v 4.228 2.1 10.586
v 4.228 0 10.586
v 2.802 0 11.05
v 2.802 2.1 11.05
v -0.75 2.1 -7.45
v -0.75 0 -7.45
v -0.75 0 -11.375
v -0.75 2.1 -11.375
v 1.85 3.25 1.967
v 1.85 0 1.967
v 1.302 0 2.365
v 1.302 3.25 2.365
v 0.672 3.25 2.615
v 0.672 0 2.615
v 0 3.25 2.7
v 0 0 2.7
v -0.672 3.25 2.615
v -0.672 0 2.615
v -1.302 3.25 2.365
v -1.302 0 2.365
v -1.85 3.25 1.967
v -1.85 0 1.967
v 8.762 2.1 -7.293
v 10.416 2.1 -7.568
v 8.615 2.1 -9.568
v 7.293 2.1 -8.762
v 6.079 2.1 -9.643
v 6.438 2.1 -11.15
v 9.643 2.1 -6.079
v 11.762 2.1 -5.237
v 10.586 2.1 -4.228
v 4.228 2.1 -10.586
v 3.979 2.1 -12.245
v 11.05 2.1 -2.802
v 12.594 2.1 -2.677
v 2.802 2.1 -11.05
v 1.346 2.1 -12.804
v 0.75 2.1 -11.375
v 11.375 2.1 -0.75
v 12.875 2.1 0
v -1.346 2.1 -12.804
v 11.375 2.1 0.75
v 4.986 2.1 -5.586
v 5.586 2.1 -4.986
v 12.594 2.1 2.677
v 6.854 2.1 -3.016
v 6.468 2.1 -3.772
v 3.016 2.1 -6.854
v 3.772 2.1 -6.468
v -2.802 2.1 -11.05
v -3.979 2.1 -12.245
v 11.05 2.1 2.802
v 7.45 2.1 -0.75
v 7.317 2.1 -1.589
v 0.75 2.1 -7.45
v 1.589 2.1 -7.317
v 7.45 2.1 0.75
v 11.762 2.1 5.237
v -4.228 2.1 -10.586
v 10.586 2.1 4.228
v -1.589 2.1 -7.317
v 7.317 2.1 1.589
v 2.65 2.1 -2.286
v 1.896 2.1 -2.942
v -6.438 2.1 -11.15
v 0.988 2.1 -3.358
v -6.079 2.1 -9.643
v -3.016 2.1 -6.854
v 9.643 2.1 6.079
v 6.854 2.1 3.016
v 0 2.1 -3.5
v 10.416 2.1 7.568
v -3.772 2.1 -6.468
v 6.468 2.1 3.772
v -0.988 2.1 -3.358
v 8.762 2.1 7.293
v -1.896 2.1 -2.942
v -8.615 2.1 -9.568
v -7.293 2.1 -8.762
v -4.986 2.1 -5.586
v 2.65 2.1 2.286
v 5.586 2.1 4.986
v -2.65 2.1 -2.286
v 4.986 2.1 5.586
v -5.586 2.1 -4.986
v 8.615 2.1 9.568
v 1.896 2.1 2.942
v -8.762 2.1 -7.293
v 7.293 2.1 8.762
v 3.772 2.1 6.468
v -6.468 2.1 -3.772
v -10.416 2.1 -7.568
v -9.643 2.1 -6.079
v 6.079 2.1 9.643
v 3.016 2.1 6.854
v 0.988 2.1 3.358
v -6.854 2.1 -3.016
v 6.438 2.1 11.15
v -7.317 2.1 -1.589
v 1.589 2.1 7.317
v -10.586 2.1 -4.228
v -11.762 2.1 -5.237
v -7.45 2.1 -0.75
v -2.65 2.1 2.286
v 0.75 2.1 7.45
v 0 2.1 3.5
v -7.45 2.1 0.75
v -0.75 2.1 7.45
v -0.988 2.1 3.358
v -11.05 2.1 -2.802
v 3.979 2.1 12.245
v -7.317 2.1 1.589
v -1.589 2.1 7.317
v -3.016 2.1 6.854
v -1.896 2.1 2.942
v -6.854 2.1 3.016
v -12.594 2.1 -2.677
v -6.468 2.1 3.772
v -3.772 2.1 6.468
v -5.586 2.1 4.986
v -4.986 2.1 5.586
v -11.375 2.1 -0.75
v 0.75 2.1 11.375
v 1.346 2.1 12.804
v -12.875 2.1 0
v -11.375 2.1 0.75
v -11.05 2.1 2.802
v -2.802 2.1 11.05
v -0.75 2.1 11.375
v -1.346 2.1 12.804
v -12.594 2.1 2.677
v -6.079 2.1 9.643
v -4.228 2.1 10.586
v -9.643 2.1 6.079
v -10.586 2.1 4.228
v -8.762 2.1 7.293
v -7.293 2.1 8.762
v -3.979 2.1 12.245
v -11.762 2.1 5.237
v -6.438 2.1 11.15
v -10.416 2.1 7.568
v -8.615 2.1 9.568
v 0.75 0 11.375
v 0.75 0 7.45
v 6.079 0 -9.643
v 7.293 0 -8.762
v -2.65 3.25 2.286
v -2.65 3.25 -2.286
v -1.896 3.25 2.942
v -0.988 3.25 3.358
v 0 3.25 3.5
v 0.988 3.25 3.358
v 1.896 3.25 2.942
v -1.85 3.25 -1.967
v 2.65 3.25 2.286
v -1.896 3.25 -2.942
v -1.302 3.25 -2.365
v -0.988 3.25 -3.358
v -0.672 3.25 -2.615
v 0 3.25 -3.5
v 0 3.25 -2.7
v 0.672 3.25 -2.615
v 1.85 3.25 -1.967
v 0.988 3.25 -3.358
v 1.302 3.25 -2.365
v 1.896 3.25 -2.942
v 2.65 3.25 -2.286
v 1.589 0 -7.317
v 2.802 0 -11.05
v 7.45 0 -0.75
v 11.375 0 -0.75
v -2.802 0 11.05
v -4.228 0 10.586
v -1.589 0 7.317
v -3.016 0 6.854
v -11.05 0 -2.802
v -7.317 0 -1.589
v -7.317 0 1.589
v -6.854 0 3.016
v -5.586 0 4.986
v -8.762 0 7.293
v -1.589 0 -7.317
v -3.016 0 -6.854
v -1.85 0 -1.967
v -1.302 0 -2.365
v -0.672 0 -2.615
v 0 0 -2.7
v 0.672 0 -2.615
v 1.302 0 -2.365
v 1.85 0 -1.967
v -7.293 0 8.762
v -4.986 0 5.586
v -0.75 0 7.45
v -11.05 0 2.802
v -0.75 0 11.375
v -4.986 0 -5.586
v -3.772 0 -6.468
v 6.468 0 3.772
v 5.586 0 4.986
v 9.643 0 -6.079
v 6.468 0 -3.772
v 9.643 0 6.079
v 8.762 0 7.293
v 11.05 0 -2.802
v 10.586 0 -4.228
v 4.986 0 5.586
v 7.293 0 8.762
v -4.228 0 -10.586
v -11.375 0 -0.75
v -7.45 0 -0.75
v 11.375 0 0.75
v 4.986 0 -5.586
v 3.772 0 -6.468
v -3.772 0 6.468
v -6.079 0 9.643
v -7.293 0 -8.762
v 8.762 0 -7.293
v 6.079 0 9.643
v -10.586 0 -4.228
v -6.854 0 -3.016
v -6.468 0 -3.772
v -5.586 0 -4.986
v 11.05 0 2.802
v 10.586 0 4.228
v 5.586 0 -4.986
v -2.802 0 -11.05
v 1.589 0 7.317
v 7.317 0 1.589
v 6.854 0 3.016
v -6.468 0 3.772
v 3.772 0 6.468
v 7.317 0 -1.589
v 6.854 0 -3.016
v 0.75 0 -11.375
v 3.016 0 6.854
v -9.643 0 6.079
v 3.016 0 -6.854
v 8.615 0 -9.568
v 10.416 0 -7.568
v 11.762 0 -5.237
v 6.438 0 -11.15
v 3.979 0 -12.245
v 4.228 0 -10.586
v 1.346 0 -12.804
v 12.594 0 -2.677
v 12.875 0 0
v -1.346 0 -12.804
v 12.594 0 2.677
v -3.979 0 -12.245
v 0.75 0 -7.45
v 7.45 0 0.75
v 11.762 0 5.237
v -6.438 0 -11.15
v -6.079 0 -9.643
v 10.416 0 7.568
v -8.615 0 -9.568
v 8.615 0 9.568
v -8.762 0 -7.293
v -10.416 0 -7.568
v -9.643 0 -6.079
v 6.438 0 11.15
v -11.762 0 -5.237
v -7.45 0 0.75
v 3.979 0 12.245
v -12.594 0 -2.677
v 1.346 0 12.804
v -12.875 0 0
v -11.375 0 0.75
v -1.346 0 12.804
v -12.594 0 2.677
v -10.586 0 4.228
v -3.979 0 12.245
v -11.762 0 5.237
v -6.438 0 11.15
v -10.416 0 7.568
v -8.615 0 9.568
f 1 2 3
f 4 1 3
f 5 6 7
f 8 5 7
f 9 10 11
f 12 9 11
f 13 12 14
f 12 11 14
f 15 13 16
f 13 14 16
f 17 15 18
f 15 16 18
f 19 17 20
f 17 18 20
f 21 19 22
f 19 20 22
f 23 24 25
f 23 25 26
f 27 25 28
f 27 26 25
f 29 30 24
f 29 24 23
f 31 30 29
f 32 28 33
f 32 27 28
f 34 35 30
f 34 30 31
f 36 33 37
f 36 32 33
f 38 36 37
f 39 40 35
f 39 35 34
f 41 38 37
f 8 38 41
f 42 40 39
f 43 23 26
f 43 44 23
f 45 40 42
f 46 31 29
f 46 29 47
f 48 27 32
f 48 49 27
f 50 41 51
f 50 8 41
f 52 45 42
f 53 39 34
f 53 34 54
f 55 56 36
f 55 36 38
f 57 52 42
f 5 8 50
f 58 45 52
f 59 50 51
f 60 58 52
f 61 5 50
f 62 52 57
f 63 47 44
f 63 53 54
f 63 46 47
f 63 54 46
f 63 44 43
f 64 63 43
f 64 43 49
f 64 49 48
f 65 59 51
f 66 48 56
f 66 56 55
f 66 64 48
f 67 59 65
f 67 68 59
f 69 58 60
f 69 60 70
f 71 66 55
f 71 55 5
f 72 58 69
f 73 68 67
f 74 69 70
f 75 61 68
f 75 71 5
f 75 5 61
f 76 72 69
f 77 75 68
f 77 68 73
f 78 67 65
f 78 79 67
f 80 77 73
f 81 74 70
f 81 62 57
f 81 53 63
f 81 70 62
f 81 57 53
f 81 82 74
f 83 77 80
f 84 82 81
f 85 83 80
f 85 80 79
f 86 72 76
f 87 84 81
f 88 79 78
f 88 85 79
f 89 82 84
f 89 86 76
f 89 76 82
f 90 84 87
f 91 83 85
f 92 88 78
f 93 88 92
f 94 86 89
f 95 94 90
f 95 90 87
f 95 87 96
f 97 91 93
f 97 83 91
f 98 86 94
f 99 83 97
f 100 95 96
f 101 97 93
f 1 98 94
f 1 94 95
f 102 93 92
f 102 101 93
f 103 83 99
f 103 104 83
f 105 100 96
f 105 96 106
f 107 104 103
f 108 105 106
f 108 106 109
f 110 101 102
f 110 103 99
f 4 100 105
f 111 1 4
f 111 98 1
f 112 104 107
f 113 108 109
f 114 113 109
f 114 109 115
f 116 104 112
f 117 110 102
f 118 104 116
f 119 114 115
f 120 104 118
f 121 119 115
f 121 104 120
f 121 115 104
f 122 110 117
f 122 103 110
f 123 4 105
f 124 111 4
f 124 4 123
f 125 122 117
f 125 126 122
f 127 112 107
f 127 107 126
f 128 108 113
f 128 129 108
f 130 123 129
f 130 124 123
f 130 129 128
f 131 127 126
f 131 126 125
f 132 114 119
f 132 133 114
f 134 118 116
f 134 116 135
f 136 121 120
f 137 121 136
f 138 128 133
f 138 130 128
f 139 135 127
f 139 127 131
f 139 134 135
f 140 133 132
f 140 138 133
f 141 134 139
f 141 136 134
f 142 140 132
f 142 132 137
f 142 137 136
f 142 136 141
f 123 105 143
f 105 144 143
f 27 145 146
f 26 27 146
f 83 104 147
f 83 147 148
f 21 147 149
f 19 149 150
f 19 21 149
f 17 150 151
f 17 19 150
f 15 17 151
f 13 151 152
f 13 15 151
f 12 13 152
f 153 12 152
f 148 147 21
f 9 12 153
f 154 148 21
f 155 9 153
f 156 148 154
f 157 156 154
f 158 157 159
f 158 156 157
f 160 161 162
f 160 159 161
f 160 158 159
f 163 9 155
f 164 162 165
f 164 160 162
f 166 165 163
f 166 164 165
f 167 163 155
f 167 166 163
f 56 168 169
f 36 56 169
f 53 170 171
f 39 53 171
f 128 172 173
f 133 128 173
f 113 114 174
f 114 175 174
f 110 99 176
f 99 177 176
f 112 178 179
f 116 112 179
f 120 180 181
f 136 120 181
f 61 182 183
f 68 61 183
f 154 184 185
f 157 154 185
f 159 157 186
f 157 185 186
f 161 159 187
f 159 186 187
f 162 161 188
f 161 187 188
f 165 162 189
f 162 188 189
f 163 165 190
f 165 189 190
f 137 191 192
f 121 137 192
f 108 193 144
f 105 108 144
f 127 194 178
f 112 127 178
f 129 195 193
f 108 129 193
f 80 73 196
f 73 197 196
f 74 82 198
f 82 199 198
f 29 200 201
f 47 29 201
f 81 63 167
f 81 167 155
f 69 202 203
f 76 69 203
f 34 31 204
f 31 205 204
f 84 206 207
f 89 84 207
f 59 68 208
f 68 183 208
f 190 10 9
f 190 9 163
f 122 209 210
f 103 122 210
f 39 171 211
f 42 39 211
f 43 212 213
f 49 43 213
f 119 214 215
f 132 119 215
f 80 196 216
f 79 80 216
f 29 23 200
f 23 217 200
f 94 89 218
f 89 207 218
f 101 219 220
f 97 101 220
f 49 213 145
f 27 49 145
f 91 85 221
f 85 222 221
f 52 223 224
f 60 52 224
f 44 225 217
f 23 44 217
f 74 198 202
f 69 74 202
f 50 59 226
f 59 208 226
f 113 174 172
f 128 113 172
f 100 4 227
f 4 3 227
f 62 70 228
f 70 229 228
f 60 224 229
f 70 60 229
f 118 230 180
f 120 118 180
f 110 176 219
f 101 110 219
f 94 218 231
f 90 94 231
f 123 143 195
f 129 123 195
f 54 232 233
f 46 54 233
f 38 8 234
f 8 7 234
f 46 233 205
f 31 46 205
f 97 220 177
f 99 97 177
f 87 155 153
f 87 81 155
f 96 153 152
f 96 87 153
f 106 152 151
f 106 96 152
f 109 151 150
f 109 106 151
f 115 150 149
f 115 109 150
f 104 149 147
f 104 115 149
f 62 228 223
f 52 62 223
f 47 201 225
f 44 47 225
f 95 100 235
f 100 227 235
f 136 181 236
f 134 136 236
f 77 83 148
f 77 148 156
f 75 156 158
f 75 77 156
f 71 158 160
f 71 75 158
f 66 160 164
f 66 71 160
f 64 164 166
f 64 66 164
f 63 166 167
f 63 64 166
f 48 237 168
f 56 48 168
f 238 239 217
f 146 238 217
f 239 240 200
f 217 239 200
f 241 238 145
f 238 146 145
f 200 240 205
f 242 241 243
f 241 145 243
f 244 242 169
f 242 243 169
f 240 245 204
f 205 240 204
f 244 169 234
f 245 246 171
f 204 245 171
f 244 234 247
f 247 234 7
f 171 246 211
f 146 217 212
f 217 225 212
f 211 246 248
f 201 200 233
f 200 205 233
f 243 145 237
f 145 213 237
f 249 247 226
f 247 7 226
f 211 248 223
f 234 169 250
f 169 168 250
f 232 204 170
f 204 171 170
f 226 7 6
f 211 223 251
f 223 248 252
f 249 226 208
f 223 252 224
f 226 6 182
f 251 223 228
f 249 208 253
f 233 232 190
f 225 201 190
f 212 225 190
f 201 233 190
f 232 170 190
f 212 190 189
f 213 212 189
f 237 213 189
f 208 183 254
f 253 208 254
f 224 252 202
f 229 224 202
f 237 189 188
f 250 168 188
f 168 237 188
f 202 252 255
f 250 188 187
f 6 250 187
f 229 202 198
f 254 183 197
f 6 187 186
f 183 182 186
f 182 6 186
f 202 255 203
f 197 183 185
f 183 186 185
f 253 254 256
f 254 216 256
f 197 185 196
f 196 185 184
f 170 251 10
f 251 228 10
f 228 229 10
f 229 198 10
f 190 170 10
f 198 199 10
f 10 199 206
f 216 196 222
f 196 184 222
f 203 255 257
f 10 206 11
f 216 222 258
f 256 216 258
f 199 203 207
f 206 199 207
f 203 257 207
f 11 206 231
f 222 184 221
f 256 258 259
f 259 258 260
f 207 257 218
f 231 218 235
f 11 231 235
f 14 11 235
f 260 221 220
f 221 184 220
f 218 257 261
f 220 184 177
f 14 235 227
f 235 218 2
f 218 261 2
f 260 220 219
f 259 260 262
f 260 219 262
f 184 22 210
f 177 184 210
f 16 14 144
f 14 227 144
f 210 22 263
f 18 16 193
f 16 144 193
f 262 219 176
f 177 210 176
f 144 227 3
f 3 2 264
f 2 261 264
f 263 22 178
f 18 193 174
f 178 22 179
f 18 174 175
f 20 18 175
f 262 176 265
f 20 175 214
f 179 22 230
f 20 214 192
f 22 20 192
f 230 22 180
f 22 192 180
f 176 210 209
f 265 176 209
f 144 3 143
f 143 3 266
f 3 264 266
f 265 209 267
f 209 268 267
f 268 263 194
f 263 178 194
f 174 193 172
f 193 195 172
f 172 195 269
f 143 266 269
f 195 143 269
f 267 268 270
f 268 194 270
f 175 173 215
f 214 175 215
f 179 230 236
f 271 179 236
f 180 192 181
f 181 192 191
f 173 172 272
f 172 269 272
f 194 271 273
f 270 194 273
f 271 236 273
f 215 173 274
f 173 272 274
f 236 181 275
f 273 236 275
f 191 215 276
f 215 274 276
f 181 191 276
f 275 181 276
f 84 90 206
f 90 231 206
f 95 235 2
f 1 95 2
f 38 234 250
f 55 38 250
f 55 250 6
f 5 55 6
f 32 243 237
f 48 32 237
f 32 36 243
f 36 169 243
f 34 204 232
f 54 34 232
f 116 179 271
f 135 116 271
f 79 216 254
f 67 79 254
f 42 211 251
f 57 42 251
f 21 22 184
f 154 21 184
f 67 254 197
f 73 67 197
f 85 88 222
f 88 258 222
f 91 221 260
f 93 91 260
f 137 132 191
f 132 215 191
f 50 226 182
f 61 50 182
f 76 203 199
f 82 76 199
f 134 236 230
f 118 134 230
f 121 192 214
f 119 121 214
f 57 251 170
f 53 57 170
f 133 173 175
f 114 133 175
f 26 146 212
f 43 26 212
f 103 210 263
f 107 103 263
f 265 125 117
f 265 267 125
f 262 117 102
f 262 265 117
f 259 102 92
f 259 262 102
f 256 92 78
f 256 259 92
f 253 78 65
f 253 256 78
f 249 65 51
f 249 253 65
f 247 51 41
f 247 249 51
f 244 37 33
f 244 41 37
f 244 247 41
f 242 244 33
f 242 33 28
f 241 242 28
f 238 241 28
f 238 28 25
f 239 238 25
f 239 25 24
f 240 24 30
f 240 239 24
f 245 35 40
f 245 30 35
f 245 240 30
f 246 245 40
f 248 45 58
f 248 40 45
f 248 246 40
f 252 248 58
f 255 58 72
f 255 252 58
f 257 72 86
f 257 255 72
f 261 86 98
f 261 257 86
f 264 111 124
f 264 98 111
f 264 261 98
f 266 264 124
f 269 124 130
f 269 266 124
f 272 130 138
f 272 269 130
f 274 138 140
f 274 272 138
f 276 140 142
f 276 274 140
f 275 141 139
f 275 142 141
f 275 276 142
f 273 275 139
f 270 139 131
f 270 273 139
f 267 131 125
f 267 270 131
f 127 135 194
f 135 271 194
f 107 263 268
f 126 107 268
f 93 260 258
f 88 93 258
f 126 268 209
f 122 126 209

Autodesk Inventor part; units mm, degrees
ref_plane "YZ Plane" through (0, 0, 0) normal (1, 0, 0) x (0, 1, 0)
ref_plane "XZ Plane" through (0, 0, 0) normal (0, 1, 0) x (-1, 0, 0)
ref_plane "XY Plane" through (0, 0, 0) normal (0, 0, 1) x (1, 0, 0)
sketch "Sketch1" plane through (0, 0, 0) normal (0, 1, 0) x (-1, 0, 0)
  circle A0 centre (0, 0) radius 12.875
  arc A1 (-1.85, -1.9666) -> (1.85, -1.9666) centre (0, 0) ccw
  line L0 (1.85, 1.9666) -> (1.85, -1.9666)
  line L1 (-1.85, 1.9666) -> (-1.85, -1.9666)
  line L2 (7.45, 0.75) -> (11.375, 0.75)
  line L3 (11.375, 0.75) -> (11.375, -0.75)
  line L4 (11.375, -0.75) -> (7.45, -0.75)
  line L5 (7.45, -0.75) -> (7.45, 0.75)
  line L6 (0, 0) -> (11.375, 0) construction
  line L7 (11.05, 2.8018) -> (7.3171, 1.5889)
  line L8 (10.5865, 4.2284) -> (11.05, 2.8018)
  line L9 (6.8536, 3.0155) -> (10.5865, 4.2284)
  line L10 (7.3171, 1.5889) -> (6.8536, 3.0155)
  line L11 (9.6434, 6.0793) -> (6.468, 3.7722)
  line L12 (8.7617, 7.2928) -> (9.6434, 6.0793)
  line L13 (5.5863, 4.9858) -> (8.7617, 7.2928)
  line L14 (6.468, 3.7722) -> (5.5863, 4.9858)
  line L15 (7.2928, 8.7617) -> (4.9858, 5.5863)
  line L16 (6.0793, 9.6434) -> (7.2928, 8.7617)
  line L17 (3.7722, 6.468) -> (6.0793, 9.6434)
  line L18 (4.9858, 5.5863) -> (3.7722, 6.468)
  line L19 (4.2284, 10.5865) -> (3.0155, 6.8536)
  line L20 (2.8018, 11.05) -> (4.2284, 10.5865)
  line L21 (1.5889, 7.3171) -> (2.8018, 11.05)
  line L22 (3.0155, 6.8536) -> (1.5889, 7.3171)
  line L23 (0.75, 11.375) -> (0.75, 7.45)
  line L24 (-0.75, 11.375) -> (0.75, 11.375)
  line L25 (-0.75, 7.45) -> (-0.75, 11.375)
  line L26 (0.75, 7.45) -> (-0.75, 7.45)
  line L27 (-2.8018, 11.05) -> (-1.5889, 7.3171)
  line L28 (-4.2284, 10.5865) -> (-2.8018, 11.05)
  line L29 (-3.0155, 6.8536) -> (-4.2284, 10.5865)
  line L30 (-1.5889, 7.3171) -> (-3.0155, 6.8536)
  line L31 (-6.0793, 9.6434) -> (-3.7722, 6.468)
  line L32 (-7.2928, 8.7617) -> (-6.0793, 9.6434)
  line L33 (-4.9858, 5.5863) -> (-7.2928, 8.7617)
  line L34 (-3.7722, 6.468) -> (-4.9858, 5.5863)
  line L35 (-8.7617, 7.2928) -> (-5.5863, 4.9858)
  line L36 (-9.6434, 6.0793) -> (-8.7617, 7.2928)
  line L37 (-6.468, 3.7722) -> (-9.6434, 6.0793)
  line L38 (-5.5863, 4.9858) -> (-6.468, 3.7722)
  line L39 (-10.5865, 4.2284) -> (-6.8536, 3.0155)
  line L40 (-11.05, 2.8018) -> (-10.5865, 4.2284)
  line L41 (-7.3171, 1.5889) -> (-11.05, 2.8018)
  line L42 (-6.8536, 3.0155) -> (-7.3171, 1.5889)
  line L43 (-11.375, 0.75) -> (-7.45, 0.75)
  line L44 (-11.375, -0.75) -> (-11.375, 0.75)
  line L45 (-7.45, -0.75) -> (-11.375, -0.75)
  line L46 (-7.45, 0.75) -> (-7.45, -0.75)
  line L47 (-11.05, -2.8018) -> (-7.3171, -1.5889)
  line L48 (-10.5865, -4.2284) -> (-11.05, -2.8018)
  line L49 (-6.8536, -3.0155) -> (-10.5865, -4.2284)
  line L50 (-7.3171, -1.5889) -> (-6.8536, -3.0155)
  line L51 (-9.6434, -6.0793) -> (-6.468, -3.7722)
  line L52 (-8.7617, -7.2928) -> (-9.6434, -6.0793)
  line L53 (-5.5863, -4.9858) -> (-8.7617, -7.2928)
  line L54 (-6.468, -3.7722) -> (-5.5863, -4.9858)
  line L55 (-7.2928, -8.7617) -> (-4.9858, -5.5863)
  line L56 (-6.0793, -9.6434) -> (-7.2928, -8.7617)
  line L57 (-3.7722, -6.468) -> (-6.0793, -9.6434)
  line L58 (-4.9858, -5.5863) -> (-3.7722, -6.468)
  line L59 (-4.2284, -10.5865) -> (-3.0155, -6.8536)
  line L60 (-2.8018, -11.05) -> (-4.2284, -10.5865)
  line L61 (-1.5889, -7.3171) -> (-2.8018, -11.05)
  line L62 (-3.0155, -6.8536) -> (-1.5889, -7.3171)
  line L63 (-0.75, -11.375) -> (-0.75, -7.45)
  line L64 (0.75, -11.375) -> (-0.75, -11.375)
  line L65 (0.75, -7.45) -> (0.75, -11.375)
  line L66 (-0.75, -7.45) -> (0.75, -7.45)
  line L67 (2.8018, -11.05) -> (1.5889, -7.3171)
  line L68 (4.2284, -10.5865) -> (2.8018, -11.05)
  line L69 (3.0155, -6.8536) -> (4.2284, -10.5865)
  line L70 (1.5889, -7.3171) -> (3.0155, -6.8536)
  line L71 (6.0793, -9.6434) -> (3.7722, -6.468)
  line L72 (7.2928, -8.7617) -> (6.0793, -9.6434)
  line L73 (4.9858, -5.5863) -> (7.2928, -8.7617)
  line L74 (3.7722, -6.468) -> (4.9858, -5.5863)
  line L75 (8.7617, -7.2928) -> (5.5863, -4.9858)
  line L76 (9.6434, -6.0793) -> (8.7617, -7.2928)
  line L77 (6.468, -3.7722) -> (9.6434, -6.0793)
  line L78 (5.5863, -4.9858) -> (6.468, -3.7722)
  line L79 (10.5865, -4.2284) -> (6.8536, -3.0155)
  line L80 (11.05, -2.8018) -> (10.5865, -4.2284)
  line L81 (7.3171, -1.5889) -> (11.05, -2.8018)
  line L82 (6.8536, -3.0155) -> (7.3171, -1.5889)
  arc A2 (-1.85, 1.9666) -> (-1.85, -1.9666) centre (0, 0) ccw construction
  arc A3 (1.85, 1.9666) -> (-1.85, 1.9666) centre (0, 0) ccw
  arc A4 (1.85, -1.9666) -> (1.85, 1.9666) centre (0, 0) ccw construction
  point P0 (10.8183, 3.5151)
  point P1 (9.2026, 6.6861)
  point P2 (6.6861, 9.2026)
  point P3 (3.5151, 10.8183)
  point P4 (0, 11.375)
  point P5 (-3.5151, 10.8183)
  point P6 (-6.6861, 9.2026)
  point P7 (-9.2026, 6.6861)
  point P8 (-10.8183, 3.5151)
  point P9 (-11.375, 0)
  point P10 (-10.8183, -3.5151)
  point P11 (-9.2026, -6.6861)
  point P12 (-6.6861, -9.2026)
  point P13 (-3.5151, -10.8183)
  point P14 (0, -11.375)
  point P15 (3.5151, -10.8183)
  point P16 (6.6861, -9.2026)
  point P17 (9.2026, -6.6861)
  point P18 (10.8183, -3.5151)
  dimension "d0" = 25.75
  dimension "d1" = 5.4
  dimension "d3" = 3.7
  dimension "d4" = 4.75
  dimension "d5" = 1.5
  dimension "d6" = 1.5
  dimension "d9" = 360
extrude "Extrusion1" add sketch "Sketch1" along normal blind 2.1
sketch "Sketch2" plane through (0, 2.1, 0) normal (0, 1, 0) x (1, 0, 0)
  arc A0 (1.85, 1.9666) -> (-1.85, 1.9666) centre (0, 0) ccw projected
  line L0 (1.85, 1.9666) -> (1.85, -1.9666) projected
  arc A1 (-1.85, -1.9666) -> (1.85, -1.9666) centre (0, 0) ccw projected
  line L1 (-1.85, -1.9666) -> (-1.85, 1.9666) projected
  arc A2 (-2.65, -2.2864) -> (2.65, -2.2864) centre (0, 0) ccw
  arc A3 (2.65, 2.2864) -> (-2.65, 2.2864) centre (0, 0) ccw
  line L2 (-2.65, -2.2864) -> (-2.65, 2.2864)
  line L3 (2.65, 2.2864) -> (2.65, -2.2864)
  dimension "d13" = 0.8
  dimension "d14" = 0.8
  dimension "d15" = 0.8
extrude "Extrusion2" add sketch "Sketch2" along normal blind 1.15
properties part number "TT encoder disk"
